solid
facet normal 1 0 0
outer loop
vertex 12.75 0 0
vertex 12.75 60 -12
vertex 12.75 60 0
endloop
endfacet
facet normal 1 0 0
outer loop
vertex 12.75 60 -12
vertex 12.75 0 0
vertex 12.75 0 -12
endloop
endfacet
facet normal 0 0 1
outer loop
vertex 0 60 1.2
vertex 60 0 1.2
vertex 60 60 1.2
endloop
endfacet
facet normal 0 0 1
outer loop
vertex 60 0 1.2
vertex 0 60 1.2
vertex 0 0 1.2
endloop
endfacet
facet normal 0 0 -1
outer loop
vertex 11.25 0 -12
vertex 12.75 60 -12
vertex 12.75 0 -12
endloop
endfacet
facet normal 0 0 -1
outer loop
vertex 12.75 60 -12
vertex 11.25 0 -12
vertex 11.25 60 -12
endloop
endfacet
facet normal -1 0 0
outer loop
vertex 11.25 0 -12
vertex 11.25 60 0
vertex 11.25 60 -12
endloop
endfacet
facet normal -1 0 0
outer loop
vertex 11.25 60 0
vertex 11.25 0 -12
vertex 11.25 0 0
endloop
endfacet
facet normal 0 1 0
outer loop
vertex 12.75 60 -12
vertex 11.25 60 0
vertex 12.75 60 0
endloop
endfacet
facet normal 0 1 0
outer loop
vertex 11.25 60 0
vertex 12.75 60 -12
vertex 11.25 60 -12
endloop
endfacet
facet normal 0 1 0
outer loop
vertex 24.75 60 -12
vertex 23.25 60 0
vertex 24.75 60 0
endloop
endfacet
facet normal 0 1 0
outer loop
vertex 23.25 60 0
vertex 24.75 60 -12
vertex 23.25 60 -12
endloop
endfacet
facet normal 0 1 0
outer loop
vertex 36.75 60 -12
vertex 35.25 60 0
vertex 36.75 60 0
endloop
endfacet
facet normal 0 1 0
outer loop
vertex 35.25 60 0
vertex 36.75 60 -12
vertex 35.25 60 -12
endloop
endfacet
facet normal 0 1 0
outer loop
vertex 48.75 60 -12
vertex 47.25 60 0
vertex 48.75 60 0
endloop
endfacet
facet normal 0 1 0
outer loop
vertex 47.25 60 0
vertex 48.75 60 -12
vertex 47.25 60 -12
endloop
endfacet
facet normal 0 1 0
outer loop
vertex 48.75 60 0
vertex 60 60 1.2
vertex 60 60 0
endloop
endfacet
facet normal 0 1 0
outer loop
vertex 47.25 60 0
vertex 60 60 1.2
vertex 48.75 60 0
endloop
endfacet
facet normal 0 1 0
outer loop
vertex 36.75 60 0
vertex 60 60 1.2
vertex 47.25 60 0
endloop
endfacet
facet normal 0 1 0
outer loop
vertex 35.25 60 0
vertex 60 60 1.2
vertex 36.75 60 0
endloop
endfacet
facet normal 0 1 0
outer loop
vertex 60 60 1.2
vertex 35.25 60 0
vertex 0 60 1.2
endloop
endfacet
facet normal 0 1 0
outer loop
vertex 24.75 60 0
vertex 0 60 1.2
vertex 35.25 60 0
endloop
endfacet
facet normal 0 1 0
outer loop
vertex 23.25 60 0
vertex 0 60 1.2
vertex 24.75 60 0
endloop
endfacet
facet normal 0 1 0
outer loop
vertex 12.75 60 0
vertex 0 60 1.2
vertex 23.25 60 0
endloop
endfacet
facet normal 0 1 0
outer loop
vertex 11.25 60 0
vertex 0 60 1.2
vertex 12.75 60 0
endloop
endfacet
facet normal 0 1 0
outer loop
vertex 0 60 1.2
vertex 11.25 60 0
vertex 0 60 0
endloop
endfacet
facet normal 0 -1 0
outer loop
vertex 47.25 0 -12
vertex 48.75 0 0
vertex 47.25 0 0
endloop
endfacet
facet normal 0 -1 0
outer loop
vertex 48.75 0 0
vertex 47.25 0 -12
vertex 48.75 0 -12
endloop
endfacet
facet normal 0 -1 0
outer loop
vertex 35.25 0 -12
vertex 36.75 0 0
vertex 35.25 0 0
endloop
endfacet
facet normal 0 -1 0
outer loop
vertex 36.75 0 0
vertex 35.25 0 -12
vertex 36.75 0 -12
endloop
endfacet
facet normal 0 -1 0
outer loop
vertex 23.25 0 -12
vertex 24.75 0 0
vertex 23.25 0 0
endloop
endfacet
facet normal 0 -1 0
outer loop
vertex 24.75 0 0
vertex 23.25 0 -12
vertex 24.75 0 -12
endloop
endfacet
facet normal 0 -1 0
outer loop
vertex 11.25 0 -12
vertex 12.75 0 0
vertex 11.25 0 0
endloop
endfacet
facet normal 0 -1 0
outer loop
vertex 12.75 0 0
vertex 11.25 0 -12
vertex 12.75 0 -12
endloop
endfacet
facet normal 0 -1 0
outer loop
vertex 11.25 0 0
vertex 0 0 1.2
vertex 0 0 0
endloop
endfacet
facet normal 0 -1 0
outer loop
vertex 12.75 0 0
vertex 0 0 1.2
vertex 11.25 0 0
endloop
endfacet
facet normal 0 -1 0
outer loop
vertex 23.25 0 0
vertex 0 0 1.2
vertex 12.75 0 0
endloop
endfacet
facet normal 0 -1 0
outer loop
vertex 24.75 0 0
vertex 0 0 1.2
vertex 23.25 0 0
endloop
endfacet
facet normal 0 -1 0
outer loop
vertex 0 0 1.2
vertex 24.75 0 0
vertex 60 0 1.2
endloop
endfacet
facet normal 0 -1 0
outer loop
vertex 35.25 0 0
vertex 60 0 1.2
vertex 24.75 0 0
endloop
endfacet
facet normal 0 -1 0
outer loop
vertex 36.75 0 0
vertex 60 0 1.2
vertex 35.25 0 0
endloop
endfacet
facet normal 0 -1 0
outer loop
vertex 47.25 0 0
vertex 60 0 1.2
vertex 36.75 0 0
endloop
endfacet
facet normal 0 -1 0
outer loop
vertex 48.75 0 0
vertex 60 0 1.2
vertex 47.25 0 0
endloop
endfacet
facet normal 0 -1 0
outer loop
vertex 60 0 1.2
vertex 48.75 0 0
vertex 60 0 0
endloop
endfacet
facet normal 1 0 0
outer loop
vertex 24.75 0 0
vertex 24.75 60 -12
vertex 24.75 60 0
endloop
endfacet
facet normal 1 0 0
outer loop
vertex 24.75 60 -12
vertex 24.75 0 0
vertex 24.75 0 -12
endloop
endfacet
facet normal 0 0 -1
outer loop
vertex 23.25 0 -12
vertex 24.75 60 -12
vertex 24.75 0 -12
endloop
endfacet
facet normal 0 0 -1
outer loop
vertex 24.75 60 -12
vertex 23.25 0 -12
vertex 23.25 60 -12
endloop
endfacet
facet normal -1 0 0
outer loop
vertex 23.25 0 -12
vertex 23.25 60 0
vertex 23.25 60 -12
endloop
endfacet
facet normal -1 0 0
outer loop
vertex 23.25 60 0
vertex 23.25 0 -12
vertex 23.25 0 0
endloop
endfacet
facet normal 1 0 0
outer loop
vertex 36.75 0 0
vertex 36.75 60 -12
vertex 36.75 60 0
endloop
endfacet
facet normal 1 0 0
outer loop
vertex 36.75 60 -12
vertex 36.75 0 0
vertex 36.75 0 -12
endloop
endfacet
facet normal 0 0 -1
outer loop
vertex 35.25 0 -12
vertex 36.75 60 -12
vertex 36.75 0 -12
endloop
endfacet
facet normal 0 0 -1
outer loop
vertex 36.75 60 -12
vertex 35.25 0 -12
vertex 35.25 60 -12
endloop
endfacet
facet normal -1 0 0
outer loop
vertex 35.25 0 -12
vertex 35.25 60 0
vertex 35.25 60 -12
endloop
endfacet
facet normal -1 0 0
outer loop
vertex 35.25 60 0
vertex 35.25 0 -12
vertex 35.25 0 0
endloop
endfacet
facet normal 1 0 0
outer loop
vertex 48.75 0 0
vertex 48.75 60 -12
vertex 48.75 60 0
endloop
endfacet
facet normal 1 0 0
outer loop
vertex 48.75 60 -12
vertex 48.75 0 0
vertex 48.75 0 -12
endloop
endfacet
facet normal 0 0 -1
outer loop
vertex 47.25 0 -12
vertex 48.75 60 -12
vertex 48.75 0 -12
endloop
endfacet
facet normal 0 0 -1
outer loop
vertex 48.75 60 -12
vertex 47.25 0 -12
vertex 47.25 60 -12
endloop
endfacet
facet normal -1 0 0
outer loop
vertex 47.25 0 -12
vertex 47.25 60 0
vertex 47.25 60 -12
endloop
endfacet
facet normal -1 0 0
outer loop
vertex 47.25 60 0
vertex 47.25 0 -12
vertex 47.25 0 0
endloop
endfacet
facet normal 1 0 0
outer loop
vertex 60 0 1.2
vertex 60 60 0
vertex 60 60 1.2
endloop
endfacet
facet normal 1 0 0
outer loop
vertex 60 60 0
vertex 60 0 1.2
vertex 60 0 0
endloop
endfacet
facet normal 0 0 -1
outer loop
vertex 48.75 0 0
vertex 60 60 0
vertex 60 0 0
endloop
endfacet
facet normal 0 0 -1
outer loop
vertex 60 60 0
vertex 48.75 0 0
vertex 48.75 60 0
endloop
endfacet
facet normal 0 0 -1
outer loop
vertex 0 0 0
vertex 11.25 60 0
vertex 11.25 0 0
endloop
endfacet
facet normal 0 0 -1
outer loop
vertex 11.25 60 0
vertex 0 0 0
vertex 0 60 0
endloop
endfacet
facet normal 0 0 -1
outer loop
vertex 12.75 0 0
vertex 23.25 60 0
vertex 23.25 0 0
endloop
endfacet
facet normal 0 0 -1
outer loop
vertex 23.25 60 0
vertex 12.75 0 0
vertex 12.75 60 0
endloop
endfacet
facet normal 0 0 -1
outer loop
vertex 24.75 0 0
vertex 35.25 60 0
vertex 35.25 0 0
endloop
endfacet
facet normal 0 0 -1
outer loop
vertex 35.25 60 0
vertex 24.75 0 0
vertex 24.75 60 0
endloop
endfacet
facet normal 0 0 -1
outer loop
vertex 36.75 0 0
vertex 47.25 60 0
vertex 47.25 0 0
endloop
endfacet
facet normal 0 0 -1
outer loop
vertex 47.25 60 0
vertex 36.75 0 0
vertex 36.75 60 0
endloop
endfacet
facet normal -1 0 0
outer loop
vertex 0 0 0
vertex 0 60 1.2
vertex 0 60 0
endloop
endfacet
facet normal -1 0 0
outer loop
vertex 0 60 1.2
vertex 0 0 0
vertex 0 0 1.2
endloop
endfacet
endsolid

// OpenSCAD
$fn = 32;

// ----------------------------------------------------------------------
// Ribbed panel: 1.2 mm panel
// ----------------------------------------------------------------------

// --- parameters (mm) ---
panel_l = 60;             // panel length, X
panel_w = 60;             // panel width, Y
panel_t = 1.2;            // panel thickness, Z
rib_t = 1.5;              // rib thickness
rib_h = 12;               // rib height below the panel
ribs = 4;                 // number of ribs
fit_tol = 0.05;           // tolerance for press fits, mm
free_tol = 0.2;           // tolerance for clearance fits, mm

total_h = panel_t + rib_h;  // overall height

union() {
  cube([panel_l, panel_w, panel_t]);
  for (i = [1 : ribs])
    translate([i * panel_l / (ribs + 1) - rib_t / 2, 0, -rib_h])
      cube([rib_t, panel_w, rib_h + panel_t]);
}
